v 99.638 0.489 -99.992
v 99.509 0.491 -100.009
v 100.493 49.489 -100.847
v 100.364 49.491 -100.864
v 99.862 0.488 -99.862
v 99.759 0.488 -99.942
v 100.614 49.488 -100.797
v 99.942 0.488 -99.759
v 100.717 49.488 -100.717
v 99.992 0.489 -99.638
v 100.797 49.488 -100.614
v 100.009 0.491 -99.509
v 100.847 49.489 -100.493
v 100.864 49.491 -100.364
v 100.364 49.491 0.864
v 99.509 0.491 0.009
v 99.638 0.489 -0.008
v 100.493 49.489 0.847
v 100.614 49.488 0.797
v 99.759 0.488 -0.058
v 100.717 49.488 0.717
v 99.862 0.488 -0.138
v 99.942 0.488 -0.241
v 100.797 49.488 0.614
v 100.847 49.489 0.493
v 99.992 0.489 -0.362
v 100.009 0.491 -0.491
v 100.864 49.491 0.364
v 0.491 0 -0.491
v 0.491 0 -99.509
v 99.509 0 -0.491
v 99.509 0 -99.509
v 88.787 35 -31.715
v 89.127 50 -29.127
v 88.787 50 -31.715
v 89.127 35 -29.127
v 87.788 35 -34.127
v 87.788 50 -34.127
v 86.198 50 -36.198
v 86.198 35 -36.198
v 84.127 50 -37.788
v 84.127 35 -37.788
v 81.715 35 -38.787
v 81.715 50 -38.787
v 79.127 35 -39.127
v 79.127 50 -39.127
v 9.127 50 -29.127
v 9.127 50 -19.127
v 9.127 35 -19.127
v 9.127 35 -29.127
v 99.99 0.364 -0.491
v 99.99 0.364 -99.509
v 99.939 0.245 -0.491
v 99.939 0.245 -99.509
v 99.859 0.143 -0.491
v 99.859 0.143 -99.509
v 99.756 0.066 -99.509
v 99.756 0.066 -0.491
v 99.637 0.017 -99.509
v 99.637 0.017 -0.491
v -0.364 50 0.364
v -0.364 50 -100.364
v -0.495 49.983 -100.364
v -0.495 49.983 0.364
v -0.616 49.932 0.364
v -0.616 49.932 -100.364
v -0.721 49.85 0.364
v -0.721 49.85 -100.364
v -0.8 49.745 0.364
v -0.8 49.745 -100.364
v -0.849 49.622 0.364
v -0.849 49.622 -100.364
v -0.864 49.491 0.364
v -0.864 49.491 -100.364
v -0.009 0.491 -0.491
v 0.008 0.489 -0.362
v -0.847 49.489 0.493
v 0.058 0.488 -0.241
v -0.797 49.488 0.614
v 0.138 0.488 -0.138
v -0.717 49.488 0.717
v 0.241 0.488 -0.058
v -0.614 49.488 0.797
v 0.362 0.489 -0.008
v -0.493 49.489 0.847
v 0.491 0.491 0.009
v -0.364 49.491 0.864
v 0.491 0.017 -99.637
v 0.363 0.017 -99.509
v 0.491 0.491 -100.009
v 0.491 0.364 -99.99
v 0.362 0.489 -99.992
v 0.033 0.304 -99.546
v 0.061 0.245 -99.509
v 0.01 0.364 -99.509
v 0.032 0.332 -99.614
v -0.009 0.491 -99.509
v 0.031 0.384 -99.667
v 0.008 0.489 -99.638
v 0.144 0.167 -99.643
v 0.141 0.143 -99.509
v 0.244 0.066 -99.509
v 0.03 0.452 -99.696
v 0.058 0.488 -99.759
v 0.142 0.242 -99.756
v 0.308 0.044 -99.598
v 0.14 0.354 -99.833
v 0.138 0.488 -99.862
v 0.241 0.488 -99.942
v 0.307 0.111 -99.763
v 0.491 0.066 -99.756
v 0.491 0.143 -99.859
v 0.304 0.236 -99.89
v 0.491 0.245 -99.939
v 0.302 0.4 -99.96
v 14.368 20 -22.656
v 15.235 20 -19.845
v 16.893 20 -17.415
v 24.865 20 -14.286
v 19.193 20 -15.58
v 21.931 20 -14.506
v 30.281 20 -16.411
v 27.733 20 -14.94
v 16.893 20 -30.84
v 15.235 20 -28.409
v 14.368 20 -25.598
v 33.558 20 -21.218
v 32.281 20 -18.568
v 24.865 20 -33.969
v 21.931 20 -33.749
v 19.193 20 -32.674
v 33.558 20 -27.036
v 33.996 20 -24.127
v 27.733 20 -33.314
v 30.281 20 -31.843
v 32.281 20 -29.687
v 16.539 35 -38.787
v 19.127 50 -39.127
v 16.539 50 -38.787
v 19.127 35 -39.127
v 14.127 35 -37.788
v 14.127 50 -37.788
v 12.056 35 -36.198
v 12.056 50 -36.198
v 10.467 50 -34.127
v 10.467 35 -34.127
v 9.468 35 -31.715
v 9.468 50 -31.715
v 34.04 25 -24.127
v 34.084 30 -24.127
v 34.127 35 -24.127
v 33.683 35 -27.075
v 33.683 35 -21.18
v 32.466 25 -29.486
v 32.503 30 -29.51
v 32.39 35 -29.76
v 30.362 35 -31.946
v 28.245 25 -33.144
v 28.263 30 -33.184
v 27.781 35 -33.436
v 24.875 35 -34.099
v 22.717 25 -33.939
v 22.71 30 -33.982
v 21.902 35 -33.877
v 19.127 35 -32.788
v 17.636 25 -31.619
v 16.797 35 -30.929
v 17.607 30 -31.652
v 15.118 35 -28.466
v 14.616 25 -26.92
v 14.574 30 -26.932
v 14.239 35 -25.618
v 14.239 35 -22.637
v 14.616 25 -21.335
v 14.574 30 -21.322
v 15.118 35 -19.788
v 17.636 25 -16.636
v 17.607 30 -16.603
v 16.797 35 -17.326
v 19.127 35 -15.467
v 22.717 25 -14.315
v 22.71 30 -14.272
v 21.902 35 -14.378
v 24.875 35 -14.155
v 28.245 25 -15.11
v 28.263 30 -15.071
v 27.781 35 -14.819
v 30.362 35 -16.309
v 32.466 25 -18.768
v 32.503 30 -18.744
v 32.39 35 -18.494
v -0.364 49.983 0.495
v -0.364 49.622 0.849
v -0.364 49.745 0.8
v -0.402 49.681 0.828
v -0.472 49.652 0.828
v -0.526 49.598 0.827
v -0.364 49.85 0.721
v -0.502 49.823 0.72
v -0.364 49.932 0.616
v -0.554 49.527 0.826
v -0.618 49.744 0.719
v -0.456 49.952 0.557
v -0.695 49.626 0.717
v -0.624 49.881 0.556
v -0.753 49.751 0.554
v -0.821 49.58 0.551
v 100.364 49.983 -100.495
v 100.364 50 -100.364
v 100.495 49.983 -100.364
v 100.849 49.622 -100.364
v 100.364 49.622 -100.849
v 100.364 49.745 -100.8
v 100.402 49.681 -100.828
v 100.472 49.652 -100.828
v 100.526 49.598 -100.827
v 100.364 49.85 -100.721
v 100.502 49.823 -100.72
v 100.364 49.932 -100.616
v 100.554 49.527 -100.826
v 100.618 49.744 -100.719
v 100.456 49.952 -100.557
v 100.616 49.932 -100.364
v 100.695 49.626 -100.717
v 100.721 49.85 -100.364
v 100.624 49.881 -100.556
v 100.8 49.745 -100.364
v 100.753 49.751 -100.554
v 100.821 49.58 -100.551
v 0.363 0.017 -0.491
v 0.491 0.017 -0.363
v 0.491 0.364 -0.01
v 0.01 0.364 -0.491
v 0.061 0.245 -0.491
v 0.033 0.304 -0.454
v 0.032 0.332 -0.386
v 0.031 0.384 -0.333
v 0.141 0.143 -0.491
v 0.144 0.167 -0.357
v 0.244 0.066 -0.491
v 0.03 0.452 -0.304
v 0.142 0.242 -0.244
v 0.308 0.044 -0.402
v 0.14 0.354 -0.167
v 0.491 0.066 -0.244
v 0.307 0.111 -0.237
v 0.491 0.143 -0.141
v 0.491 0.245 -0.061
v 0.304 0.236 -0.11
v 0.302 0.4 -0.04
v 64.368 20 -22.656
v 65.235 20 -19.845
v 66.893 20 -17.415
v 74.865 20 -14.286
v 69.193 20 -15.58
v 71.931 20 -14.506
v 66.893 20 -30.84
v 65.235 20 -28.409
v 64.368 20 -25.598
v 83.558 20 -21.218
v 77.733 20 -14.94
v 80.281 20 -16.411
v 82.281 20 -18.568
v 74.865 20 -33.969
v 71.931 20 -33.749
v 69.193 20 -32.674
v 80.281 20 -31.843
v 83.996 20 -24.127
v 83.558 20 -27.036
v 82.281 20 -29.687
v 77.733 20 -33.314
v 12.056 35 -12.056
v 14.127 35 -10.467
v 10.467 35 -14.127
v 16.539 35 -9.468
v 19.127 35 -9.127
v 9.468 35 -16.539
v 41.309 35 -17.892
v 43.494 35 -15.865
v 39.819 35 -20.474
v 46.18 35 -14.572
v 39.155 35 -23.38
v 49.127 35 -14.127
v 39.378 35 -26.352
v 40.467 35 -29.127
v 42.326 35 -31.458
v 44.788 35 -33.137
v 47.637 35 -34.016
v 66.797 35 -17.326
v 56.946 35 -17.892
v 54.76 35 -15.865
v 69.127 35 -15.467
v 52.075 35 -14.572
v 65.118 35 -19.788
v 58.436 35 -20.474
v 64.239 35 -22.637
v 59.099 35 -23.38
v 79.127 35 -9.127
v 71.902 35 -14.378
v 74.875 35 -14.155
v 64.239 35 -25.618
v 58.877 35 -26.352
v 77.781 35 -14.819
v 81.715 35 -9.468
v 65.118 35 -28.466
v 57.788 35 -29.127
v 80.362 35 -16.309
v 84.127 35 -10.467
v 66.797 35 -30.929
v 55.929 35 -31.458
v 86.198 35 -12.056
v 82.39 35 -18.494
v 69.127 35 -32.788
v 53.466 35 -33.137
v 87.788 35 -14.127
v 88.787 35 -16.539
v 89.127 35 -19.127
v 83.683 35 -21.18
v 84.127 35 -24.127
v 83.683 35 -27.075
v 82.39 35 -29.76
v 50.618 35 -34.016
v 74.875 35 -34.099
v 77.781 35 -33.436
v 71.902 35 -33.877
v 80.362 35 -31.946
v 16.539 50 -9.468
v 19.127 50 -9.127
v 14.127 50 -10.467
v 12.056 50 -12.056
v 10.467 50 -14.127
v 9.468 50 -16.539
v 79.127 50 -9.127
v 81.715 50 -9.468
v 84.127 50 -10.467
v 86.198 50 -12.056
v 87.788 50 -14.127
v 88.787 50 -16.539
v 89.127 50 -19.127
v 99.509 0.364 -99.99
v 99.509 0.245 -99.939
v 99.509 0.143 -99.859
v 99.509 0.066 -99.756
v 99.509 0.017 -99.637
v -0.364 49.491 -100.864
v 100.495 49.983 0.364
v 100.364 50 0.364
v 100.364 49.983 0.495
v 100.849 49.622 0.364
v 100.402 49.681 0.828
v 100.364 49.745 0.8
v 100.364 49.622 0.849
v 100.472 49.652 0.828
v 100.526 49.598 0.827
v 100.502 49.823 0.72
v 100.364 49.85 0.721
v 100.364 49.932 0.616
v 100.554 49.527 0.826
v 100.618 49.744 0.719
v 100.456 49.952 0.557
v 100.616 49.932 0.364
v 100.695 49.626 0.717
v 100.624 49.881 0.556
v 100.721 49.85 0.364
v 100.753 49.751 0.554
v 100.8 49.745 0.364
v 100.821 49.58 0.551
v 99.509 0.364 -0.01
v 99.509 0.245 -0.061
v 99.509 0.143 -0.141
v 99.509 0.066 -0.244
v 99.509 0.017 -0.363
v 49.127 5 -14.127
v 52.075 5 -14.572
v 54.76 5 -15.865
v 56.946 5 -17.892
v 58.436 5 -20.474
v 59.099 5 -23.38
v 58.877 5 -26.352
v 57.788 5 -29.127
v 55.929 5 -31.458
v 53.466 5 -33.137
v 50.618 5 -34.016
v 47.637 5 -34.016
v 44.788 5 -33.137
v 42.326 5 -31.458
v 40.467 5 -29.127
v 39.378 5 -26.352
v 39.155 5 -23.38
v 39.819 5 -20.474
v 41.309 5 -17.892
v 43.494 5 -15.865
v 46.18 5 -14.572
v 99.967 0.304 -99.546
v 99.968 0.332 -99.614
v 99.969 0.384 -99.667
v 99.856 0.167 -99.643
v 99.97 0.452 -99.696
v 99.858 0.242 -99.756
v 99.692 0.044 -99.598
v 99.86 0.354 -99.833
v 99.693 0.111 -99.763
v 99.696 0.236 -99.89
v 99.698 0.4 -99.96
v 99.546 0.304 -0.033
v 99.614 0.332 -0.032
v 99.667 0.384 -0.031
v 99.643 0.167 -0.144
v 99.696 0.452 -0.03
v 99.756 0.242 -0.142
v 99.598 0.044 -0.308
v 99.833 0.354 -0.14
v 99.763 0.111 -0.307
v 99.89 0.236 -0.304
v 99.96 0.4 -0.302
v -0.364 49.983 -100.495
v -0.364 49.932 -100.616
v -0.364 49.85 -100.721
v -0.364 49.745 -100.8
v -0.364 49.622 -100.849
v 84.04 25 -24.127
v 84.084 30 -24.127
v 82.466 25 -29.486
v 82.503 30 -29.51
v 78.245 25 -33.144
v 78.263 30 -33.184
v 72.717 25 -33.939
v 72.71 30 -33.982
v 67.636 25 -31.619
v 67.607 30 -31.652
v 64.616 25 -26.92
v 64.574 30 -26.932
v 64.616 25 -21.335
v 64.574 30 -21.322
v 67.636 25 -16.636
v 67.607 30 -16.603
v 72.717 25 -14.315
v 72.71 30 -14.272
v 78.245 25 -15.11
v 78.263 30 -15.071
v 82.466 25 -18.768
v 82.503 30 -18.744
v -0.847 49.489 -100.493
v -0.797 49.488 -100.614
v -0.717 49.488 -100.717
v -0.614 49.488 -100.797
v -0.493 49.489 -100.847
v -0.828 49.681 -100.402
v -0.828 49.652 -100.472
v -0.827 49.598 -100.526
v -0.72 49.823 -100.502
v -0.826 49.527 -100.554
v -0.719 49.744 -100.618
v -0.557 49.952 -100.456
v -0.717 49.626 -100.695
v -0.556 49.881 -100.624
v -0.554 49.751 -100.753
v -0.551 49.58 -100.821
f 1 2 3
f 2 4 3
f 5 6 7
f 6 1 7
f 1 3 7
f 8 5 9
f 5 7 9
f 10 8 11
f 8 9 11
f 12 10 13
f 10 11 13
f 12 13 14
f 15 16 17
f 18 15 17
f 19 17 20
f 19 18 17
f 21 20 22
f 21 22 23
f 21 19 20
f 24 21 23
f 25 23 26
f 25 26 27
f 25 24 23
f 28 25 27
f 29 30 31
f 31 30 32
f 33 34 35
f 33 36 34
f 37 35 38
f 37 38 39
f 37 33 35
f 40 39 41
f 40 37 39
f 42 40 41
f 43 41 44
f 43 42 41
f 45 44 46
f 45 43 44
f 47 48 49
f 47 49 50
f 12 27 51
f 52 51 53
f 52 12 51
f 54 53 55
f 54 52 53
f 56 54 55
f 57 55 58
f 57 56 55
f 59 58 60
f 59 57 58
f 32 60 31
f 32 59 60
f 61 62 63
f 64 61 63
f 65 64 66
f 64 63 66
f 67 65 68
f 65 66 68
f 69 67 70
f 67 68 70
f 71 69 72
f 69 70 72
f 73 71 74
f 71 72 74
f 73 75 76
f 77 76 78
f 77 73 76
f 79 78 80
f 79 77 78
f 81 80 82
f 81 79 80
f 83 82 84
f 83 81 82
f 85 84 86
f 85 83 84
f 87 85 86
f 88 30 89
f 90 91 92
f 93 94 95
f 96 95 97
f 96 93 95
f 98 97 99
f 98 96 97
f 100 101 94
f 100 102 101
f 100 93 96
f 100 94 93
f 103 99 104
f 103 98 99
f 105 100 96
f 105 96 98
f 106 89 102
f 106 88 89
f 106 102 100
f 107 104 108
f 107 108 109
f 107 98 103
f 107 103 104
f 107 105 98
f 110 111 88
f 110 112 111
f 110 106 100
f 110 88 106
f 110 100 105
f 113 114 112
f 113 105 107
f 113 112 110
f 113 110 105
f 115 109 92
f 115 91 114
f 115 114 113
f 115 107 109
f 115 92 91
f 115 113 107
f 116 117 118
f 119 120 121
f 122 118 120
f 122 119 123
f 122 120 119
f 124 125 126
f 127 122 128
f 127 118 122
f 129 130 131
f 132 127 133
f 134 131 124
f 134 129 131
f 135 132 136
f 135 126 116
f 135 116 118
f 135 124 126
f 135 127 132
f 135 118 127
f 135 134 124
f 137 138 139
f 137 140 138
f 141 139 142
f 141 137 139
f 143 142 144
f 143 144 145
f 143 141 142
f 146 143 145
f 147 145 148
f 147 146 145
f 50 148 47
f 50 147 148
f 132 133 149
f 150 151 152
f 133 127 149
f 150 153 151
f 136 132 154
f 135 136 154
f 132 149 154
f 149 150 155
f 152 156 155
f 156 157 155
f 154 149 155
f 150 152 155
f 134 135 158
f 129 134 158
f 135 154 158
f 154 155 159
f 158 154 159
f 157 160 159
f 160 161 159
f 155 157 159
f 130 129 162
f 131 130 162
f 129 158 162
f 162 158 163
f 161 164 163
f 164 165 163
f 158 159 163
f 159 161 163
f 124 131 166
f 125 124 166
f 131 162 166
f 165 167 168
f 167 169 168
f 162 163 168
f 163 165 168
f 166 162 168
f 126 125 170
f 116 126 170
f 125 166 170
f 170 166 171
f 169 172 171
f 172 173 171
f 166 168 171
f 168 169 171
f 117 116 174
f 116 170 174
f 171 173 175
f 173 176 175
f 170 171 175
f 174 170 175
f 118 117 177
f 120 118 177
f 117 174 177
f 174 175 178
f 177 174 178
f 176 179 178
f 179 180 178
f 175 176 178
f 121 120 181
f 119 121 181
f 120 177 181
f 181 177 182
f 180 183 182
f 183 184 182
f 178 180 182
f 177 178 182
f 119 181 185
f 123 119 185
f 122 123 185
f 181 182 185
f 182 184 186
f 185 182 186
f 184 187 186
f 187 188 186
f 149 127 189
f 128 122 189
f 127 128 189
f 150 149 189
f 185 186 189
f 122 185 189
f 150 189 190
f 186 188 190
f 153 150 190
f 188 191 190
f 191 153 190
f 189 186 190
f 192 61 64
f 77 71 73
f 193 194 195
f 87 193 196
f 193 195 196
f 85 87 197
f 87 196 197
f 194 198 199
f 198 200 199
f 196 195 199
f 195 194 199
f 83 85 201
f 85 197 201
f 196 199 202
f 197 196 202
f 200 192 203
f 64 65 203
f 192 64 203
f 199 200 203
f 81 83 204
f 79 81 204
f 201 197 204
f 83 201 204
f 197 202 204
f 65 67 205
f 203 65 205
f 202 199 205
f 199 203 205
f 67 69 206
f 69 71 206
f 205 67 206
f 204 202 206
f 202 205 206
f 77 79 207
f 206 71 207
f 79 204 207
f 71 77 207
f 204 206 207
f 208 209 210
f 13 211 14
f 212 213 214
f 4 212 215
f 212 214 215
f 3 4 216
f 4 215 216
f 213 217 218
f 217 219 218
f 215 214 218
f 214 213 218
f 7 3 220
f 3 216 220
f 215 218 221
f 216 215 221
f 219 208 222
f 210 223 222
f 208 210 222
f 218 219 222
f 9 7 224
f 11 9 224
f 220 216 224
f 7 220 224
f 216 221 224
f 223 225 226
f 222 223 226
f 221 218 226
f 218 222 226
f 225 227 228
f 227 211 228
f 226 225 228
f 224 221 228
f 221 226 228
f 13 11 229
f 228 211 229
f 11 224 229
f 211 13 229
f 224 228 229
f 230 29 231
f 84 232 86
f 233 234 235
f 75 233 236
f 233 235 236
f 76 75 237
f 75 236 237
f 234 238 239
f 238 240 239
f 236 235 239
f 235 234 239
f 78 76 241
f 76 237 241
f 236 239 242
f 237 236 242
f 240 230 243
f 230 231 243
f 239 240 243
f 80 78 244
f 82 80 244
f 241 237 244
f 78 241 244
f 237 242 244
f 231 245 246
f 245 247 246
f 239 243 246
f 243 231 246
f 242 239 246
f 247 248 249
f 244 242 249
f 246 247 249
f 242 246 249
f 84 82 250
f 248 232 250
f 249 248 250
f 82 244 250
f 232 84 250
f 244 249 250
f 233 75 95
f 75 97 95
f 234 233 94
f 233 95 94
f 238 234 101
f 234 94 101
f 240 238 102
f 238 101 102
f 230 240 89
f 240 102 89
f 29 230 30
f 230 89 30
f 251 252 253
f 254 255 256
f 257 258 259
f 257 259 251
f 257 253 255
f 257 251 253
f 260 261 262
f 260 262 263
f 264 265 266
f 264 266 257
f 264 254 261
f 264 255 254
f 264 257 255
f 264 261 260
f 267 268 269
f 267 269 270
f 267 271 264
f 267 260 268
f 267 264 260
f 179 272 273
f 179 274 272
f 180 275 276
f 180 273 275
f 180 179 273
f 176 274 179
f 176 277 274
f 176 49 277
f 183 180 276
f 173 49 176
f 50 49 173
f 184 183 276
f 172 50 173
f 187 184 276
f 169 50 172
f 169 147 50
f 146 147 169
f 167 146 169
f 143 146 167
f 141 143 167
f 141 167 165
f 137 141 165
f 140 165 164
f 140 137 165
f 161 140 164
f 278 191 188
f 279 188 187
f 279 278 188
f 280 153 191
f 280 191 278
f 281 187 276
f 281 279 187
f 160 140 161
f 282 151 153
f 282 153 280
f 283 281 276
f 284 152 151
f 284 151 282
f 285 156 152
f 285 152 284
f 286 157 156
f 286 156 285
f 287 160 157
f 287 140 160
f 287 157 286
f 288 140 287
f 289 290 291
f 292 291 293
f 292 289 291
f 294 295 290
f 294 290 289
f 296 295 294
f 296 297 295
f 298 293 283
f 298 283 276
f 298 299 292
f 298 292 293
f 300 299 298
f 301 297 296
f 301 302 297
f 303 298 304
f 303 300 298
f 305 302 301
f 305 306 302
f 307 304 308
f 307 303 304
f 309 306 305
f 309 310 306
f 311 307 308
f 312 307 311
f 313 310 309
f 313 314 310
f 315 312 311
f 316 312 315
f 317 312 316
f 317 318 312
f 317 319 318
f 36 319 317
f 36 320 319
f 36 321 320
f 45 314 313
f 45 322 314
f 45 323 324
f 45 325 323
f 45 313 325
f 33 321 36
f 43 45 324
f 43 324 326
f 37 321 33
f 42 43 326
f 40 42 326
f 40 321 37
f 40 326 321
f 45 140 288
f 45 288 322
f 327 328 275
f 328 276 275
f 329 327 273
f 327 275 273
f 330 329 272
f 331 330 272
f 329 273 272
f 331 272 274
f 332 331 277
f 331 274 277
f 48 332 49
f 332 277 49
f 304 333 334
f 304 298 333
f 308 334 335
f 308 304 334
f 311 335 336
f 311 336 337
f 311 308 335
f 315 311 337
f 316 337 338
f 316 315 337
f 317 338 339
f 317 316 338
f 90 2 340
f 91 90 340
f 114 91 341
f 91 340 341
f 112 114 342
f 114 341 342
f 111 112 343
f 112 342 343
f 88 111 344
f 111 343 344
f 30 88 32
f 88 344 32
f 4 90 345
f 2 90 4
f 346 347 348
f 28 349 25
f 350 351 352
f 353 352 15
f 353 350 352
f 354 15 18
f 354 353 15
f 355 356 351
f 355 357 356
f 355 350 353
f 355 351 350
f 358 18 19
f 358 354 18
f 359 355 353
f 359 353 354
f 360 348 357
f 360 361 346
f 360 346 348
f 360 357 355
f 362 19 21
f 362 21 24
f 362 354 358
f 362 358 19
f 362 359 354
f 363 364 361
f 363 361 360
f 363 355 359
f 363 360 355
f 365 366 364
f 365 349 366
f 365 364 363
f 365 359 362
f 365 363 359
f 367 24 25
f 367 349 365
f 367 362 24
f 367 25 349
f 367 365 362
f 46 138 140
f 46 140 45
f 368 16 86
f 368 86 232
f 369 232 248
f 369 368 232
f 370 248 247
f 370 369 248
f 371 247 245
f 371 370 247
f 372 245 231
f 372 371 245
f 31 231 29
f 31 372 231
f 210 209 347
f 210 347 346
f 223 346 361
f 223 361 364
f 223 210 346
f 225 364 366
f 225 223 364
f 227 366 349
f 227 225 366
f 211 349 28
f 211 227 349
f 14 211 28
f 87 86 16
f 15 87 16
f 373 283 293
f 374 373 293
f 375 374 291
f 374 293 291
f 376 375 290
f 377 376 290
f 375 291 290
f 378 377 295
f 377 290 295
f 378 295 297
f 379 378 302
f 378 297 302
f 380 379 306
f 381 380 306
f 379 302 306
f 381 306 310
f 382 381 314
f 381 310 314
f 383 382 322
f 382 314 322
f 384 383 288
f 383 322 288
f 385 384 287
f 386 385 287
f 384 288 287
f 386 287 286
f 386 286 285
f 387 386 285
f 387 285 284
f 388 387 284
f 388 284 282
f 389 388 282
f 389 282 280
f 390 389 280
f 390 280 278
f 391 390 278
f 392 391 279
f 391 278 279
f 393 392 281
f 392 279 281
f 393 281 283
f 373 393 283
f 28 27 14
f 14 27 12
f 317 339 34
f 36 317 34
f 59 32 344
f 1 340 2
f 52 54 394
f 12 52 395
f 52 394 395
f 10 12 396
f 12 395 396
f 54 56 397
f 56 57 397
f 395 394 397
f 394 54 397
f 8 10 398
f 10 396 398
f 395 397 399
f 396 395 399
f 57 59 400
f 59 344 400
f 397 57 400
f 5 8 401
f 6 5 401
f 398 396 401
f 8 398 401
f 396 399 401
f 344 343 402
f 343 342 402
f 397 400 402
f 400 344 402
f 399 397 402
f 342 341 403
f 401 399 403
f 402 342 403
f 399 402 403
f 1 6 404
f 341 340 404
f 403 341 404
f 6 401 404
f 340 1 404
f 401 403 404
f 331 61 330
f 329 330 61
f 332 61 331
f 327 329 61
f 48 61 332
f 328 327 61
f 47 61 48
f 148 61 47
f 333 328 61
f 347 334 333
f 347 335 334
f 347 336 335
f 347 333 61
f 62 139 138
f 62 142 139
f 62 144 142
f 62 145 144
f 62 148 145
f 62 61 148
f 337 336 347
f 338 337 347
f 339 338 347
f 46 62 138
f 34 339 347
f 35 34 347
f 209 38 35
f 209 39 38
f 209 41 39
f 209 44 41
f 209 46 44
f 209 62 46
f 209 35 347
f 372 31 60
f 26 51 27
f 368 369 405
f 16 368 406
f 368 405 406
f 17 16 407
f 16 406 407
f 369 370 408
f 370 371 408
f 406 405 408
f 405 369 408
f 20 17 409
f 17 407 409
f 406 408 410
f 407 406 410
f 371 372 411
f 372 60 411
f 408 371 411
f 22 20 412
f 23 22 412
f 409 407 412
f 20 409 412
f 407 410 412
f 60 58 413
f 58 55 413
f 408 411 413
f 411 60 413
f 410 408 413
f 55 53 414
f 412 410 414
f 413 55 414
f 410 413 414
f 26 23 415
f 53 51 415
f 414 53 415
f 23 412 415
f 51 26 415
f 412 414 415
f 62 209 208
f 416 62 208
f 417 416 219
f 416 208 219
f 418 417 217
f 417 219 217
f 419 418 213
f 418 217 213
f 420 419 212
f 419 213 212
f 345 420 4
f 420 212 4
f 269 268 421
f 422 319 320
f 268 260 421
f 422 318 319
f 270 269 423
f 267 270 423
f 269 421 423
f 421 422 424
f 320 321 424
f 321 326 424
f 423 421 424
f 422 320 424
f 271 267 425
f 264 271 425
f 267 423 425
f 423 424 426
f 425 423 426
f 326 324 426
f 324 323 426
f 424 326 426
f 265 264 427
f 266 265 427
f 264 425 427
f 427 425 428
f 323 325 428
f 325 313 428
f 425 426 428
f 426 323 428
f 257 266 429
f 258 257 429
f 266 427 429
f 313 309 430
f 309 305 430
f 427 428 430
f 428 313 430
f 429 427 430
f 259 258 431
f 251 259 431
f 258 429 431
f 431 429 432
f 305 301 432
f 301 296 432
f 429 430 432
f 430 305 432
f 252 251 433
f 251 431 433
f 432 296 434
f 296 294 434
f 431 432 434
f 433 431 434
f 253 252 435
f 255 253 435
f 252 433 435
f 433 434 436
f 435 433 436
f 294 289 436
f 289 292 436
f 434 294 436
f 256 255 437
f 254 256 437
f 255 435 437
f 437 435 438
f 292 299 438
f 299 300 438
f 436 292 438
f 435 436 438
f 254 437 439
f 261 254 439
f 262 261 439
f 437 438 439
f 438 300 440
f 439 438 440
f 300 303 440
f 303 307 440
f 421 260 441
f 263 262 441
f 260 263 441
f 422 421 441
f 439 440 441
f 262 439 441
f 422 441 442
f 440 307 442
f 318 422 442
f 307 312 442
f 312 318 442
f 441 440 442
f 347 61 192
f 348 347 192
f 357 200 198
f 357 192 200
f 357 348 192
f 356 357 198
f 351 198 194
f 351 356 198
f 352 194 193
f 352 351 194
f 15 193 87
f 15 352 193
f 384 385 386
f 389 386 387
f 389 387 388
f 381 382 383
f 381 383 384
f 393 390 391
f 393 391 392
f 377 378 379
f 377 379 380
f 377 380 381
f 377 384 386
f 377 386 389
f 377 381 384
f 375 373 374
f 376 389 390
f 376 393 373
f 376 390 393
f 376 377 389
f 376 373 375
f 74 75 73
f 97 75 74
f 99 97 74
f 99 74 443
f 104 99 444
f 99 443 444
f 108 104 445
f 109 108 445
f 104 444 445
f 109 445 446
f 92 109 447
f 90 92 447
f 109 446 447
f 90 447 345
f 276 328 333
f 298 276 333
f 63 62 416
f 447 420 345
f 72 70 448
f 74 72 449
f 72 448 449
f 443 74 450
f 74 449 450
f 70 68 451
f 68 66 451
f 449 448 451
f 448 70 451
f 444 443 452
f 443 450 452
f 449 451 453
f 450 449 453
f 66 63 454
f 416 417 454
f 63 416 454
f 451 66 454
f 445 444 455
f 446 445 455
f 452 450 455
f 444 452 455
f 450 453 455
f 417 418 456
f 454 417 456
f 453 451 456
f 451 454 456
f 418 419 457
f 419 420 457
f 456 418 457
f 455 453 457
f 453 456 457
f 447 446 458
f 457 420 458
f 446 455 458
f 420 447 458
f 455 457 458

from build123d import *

# Parameters (mm, degrees)
SKETCH1_W                    = 100
SKETCH1_H                    = 100
BOSS_EXTRUDE1_DEPTH          = 50
BOSS_EXTRUDE1_DRAFT          = -1
SKETCH3_W                    = 80
SKETCH3_H                    = 30
CUT_EXTRUDE2_DEPTH           = 15
FILLET1_R                    = 10
SKETCH4_R                    = 10
CUT_EXTRUDE3_DEPTH           = 15
CUT_EXTRUDE3_DRAFT           = -0.5
CUT_EXTRUDE3_PROFILE_2_DEPTH = 15
CUT_EXTRUDE3_PROFILE_2_DRAFT = -0.5
SKETCH5_R                    = 10
CUT_EXTRUDE4_DEPTH           = 30
FILLET2_R                    = 0.5


with BuildPart() as part:
    # Sketch1 → Boss-Extrude1 (with draft: the straight prism first)
    with BuildSketch(Plane(origin=(0, 0, 0), x_dir=(1, 0, 0), z_dir=(0, 1, 0))):
        with Locations((50, 50)):
            Rectangle(SKETCH1_W, SKETCH1_H)
    extrude(amount=BOSS_EXTRUDE1_DEPTH)
    # Boss-Extrude1: the draft: its side faces are tilted about the plane it starts from
    boss_extrude1_sides = [part.faces().sort_by_distance(p)[0] for p in [
        (50, 25, 0),
        (100, 25, -50),
        (50, 25, -100),
        (0, 25, -50),
    ]]
    draft(boss_extrude1_sides, Plane(origin=(0, 0, 0), x_dir=(1, 0, 0), z_dir=(0, 1, 0)), BOSS_EXTRUDE1_DRAFT)

    # Sketch3 → Cut-Extrude2 (cut)
    with BuildSketch(Plane(origin=(0, 50, 0), x_dir=(1, 0, 0), z_dir=(0, 1, 0))):
        with Locations((49.127246754, 24.127246754)):
            Rectangle(SKETCH3_W, SKETCH3_H)
    extrude(amount=-CUT_EXTRUDE2_DEPTH, mode=Mode.SUBTRACT)

    # Fillet1
    fillet1_edges = [part.edges().sort_by_distance(p)[0] for p in [
        (9.127246754, 42.5, -9.127246754),
        (9.127246754, 42.5, -39.127246754),
        (89.127246754, 42.5, -39.127246754),
        (89.127246754, 42.5, -9.127246754),
    ]]
    fillet(fillet1_edges, radius=FILLET1_R)


with BuildPart() as cut_extrude3_tool:
    # Sketch4 → Cut-Extrude3 (with draft: the straight prism first)
    with BuildSketch(Plane(origin=(0, 35, 0), x_dir=(1, 0, 0), z_dir=(0, 1, 0))):
        with Locations((24.127246754, 24.127246754)):
            Circle(SKETCH4_R)
    extrude(amount=-CUT_EXTRUDE3_DEPTH)
    # Cut-Extrude3: the draft: its side faces are tilted about the plane it starts from
    cut_extrude3_sides = [cut_extrude3_tool.faces().sort_by_distance(p)[0] for p in [
        (14.127246754, 27.5, -24.127246754),
    ]]
    draft(cut_extrude3_sides, Plane(origin=(0, 35, 0), x_dir=(1, 0, 0), z_dir=(0, 1, 0)), CUT_EXTRUDE3_DRAFT)


with BuildPart() as part_1:
    add(part.part)

    # Cut-Extrude3: cut by cut_extrude3_tool
    add(cut_extrude3_tool.part, mode=Mode.SUBTRACT)


with BuildPart() as cut_extrude3_profile_2_tool:
    # Sketch4 → Cut-Extrude3 profile 2 (with draft: the straight prism first)
    with BuildSketch(Plane(origin=(0, 35, 0), x_dir=(1, 0, 0), z_dir=(0, 1, 0))):
        with Locations((74.127246754, 24.127246754)):
            Circle(SKETCH4_R)
    extrude(amount=-CUT_EXTRUDE3_PROFILE_2_DEPTH)
    # Cut-Extrude3 profile 2: the draft: its side faces are tilted about the plane it starts from
    cut_extrude3_profile_2_sides = [cut_extrude3_profile_2_tool.faces().sort_by_distance(p)[0] for p in [
        (64.127246754, 27.5, -24.127246754),
    ]]
    draft(cut_extrude3_profile_2_sides, Plane(origin=(0, 35, 0), x_dir=(1, 0, 0), z_dir=(0, 1, 0)), CUT_EXTRUDE3_PROFILE_2_DRAFT)


with BuildPart() as part_2:
    add(part_1.part)

    # Cut-Extrude3 profile 2: cut by cut_extrude3_profile_2_tool
    add(cut_extrude3_profile_2_tool.part, mode=Mode.SUBTRACT)

    # Sketch5 → Cut-Extrude4 (cut)
    with BuildSketch(Plane(origin=(0, 35, 0), x_dir=(1, 0, 0), z_dir=(0, 1, 0))):
        with Locations(Location((49.127246754, 24.127246754, 0), (0, 0, 270))):
            Circle(SKETCH5_R)
    extrude(amount=-CUT_EXTRUDE4_DEPTH, mode=Mode.SUBTRACT)

    # Fillet2
    fillet2_edges = [part_2.edges().sort_by_distance(p)[0] for p in [
        (100.872753246, 50, -50),
        (50, 50, -100.872753246),
        (-0.872753246, 50, -50),
        (50, 0, -100),
        (100, 0, -50),
        (50, 0, 0),
        (0, 0, -50),
        (50, 50, 0.872753246),
        (-0.436376623, 25, -100.436376623),
        (100.436376623, 25, -100.436376623),
        (100.436376623, 25, 0.436376623),
        (-0.436376623, 25, 0.436376623),
    ]]
    fillet(fillet2_edges, radius=FILLET2_R)


solid = part_2.part
